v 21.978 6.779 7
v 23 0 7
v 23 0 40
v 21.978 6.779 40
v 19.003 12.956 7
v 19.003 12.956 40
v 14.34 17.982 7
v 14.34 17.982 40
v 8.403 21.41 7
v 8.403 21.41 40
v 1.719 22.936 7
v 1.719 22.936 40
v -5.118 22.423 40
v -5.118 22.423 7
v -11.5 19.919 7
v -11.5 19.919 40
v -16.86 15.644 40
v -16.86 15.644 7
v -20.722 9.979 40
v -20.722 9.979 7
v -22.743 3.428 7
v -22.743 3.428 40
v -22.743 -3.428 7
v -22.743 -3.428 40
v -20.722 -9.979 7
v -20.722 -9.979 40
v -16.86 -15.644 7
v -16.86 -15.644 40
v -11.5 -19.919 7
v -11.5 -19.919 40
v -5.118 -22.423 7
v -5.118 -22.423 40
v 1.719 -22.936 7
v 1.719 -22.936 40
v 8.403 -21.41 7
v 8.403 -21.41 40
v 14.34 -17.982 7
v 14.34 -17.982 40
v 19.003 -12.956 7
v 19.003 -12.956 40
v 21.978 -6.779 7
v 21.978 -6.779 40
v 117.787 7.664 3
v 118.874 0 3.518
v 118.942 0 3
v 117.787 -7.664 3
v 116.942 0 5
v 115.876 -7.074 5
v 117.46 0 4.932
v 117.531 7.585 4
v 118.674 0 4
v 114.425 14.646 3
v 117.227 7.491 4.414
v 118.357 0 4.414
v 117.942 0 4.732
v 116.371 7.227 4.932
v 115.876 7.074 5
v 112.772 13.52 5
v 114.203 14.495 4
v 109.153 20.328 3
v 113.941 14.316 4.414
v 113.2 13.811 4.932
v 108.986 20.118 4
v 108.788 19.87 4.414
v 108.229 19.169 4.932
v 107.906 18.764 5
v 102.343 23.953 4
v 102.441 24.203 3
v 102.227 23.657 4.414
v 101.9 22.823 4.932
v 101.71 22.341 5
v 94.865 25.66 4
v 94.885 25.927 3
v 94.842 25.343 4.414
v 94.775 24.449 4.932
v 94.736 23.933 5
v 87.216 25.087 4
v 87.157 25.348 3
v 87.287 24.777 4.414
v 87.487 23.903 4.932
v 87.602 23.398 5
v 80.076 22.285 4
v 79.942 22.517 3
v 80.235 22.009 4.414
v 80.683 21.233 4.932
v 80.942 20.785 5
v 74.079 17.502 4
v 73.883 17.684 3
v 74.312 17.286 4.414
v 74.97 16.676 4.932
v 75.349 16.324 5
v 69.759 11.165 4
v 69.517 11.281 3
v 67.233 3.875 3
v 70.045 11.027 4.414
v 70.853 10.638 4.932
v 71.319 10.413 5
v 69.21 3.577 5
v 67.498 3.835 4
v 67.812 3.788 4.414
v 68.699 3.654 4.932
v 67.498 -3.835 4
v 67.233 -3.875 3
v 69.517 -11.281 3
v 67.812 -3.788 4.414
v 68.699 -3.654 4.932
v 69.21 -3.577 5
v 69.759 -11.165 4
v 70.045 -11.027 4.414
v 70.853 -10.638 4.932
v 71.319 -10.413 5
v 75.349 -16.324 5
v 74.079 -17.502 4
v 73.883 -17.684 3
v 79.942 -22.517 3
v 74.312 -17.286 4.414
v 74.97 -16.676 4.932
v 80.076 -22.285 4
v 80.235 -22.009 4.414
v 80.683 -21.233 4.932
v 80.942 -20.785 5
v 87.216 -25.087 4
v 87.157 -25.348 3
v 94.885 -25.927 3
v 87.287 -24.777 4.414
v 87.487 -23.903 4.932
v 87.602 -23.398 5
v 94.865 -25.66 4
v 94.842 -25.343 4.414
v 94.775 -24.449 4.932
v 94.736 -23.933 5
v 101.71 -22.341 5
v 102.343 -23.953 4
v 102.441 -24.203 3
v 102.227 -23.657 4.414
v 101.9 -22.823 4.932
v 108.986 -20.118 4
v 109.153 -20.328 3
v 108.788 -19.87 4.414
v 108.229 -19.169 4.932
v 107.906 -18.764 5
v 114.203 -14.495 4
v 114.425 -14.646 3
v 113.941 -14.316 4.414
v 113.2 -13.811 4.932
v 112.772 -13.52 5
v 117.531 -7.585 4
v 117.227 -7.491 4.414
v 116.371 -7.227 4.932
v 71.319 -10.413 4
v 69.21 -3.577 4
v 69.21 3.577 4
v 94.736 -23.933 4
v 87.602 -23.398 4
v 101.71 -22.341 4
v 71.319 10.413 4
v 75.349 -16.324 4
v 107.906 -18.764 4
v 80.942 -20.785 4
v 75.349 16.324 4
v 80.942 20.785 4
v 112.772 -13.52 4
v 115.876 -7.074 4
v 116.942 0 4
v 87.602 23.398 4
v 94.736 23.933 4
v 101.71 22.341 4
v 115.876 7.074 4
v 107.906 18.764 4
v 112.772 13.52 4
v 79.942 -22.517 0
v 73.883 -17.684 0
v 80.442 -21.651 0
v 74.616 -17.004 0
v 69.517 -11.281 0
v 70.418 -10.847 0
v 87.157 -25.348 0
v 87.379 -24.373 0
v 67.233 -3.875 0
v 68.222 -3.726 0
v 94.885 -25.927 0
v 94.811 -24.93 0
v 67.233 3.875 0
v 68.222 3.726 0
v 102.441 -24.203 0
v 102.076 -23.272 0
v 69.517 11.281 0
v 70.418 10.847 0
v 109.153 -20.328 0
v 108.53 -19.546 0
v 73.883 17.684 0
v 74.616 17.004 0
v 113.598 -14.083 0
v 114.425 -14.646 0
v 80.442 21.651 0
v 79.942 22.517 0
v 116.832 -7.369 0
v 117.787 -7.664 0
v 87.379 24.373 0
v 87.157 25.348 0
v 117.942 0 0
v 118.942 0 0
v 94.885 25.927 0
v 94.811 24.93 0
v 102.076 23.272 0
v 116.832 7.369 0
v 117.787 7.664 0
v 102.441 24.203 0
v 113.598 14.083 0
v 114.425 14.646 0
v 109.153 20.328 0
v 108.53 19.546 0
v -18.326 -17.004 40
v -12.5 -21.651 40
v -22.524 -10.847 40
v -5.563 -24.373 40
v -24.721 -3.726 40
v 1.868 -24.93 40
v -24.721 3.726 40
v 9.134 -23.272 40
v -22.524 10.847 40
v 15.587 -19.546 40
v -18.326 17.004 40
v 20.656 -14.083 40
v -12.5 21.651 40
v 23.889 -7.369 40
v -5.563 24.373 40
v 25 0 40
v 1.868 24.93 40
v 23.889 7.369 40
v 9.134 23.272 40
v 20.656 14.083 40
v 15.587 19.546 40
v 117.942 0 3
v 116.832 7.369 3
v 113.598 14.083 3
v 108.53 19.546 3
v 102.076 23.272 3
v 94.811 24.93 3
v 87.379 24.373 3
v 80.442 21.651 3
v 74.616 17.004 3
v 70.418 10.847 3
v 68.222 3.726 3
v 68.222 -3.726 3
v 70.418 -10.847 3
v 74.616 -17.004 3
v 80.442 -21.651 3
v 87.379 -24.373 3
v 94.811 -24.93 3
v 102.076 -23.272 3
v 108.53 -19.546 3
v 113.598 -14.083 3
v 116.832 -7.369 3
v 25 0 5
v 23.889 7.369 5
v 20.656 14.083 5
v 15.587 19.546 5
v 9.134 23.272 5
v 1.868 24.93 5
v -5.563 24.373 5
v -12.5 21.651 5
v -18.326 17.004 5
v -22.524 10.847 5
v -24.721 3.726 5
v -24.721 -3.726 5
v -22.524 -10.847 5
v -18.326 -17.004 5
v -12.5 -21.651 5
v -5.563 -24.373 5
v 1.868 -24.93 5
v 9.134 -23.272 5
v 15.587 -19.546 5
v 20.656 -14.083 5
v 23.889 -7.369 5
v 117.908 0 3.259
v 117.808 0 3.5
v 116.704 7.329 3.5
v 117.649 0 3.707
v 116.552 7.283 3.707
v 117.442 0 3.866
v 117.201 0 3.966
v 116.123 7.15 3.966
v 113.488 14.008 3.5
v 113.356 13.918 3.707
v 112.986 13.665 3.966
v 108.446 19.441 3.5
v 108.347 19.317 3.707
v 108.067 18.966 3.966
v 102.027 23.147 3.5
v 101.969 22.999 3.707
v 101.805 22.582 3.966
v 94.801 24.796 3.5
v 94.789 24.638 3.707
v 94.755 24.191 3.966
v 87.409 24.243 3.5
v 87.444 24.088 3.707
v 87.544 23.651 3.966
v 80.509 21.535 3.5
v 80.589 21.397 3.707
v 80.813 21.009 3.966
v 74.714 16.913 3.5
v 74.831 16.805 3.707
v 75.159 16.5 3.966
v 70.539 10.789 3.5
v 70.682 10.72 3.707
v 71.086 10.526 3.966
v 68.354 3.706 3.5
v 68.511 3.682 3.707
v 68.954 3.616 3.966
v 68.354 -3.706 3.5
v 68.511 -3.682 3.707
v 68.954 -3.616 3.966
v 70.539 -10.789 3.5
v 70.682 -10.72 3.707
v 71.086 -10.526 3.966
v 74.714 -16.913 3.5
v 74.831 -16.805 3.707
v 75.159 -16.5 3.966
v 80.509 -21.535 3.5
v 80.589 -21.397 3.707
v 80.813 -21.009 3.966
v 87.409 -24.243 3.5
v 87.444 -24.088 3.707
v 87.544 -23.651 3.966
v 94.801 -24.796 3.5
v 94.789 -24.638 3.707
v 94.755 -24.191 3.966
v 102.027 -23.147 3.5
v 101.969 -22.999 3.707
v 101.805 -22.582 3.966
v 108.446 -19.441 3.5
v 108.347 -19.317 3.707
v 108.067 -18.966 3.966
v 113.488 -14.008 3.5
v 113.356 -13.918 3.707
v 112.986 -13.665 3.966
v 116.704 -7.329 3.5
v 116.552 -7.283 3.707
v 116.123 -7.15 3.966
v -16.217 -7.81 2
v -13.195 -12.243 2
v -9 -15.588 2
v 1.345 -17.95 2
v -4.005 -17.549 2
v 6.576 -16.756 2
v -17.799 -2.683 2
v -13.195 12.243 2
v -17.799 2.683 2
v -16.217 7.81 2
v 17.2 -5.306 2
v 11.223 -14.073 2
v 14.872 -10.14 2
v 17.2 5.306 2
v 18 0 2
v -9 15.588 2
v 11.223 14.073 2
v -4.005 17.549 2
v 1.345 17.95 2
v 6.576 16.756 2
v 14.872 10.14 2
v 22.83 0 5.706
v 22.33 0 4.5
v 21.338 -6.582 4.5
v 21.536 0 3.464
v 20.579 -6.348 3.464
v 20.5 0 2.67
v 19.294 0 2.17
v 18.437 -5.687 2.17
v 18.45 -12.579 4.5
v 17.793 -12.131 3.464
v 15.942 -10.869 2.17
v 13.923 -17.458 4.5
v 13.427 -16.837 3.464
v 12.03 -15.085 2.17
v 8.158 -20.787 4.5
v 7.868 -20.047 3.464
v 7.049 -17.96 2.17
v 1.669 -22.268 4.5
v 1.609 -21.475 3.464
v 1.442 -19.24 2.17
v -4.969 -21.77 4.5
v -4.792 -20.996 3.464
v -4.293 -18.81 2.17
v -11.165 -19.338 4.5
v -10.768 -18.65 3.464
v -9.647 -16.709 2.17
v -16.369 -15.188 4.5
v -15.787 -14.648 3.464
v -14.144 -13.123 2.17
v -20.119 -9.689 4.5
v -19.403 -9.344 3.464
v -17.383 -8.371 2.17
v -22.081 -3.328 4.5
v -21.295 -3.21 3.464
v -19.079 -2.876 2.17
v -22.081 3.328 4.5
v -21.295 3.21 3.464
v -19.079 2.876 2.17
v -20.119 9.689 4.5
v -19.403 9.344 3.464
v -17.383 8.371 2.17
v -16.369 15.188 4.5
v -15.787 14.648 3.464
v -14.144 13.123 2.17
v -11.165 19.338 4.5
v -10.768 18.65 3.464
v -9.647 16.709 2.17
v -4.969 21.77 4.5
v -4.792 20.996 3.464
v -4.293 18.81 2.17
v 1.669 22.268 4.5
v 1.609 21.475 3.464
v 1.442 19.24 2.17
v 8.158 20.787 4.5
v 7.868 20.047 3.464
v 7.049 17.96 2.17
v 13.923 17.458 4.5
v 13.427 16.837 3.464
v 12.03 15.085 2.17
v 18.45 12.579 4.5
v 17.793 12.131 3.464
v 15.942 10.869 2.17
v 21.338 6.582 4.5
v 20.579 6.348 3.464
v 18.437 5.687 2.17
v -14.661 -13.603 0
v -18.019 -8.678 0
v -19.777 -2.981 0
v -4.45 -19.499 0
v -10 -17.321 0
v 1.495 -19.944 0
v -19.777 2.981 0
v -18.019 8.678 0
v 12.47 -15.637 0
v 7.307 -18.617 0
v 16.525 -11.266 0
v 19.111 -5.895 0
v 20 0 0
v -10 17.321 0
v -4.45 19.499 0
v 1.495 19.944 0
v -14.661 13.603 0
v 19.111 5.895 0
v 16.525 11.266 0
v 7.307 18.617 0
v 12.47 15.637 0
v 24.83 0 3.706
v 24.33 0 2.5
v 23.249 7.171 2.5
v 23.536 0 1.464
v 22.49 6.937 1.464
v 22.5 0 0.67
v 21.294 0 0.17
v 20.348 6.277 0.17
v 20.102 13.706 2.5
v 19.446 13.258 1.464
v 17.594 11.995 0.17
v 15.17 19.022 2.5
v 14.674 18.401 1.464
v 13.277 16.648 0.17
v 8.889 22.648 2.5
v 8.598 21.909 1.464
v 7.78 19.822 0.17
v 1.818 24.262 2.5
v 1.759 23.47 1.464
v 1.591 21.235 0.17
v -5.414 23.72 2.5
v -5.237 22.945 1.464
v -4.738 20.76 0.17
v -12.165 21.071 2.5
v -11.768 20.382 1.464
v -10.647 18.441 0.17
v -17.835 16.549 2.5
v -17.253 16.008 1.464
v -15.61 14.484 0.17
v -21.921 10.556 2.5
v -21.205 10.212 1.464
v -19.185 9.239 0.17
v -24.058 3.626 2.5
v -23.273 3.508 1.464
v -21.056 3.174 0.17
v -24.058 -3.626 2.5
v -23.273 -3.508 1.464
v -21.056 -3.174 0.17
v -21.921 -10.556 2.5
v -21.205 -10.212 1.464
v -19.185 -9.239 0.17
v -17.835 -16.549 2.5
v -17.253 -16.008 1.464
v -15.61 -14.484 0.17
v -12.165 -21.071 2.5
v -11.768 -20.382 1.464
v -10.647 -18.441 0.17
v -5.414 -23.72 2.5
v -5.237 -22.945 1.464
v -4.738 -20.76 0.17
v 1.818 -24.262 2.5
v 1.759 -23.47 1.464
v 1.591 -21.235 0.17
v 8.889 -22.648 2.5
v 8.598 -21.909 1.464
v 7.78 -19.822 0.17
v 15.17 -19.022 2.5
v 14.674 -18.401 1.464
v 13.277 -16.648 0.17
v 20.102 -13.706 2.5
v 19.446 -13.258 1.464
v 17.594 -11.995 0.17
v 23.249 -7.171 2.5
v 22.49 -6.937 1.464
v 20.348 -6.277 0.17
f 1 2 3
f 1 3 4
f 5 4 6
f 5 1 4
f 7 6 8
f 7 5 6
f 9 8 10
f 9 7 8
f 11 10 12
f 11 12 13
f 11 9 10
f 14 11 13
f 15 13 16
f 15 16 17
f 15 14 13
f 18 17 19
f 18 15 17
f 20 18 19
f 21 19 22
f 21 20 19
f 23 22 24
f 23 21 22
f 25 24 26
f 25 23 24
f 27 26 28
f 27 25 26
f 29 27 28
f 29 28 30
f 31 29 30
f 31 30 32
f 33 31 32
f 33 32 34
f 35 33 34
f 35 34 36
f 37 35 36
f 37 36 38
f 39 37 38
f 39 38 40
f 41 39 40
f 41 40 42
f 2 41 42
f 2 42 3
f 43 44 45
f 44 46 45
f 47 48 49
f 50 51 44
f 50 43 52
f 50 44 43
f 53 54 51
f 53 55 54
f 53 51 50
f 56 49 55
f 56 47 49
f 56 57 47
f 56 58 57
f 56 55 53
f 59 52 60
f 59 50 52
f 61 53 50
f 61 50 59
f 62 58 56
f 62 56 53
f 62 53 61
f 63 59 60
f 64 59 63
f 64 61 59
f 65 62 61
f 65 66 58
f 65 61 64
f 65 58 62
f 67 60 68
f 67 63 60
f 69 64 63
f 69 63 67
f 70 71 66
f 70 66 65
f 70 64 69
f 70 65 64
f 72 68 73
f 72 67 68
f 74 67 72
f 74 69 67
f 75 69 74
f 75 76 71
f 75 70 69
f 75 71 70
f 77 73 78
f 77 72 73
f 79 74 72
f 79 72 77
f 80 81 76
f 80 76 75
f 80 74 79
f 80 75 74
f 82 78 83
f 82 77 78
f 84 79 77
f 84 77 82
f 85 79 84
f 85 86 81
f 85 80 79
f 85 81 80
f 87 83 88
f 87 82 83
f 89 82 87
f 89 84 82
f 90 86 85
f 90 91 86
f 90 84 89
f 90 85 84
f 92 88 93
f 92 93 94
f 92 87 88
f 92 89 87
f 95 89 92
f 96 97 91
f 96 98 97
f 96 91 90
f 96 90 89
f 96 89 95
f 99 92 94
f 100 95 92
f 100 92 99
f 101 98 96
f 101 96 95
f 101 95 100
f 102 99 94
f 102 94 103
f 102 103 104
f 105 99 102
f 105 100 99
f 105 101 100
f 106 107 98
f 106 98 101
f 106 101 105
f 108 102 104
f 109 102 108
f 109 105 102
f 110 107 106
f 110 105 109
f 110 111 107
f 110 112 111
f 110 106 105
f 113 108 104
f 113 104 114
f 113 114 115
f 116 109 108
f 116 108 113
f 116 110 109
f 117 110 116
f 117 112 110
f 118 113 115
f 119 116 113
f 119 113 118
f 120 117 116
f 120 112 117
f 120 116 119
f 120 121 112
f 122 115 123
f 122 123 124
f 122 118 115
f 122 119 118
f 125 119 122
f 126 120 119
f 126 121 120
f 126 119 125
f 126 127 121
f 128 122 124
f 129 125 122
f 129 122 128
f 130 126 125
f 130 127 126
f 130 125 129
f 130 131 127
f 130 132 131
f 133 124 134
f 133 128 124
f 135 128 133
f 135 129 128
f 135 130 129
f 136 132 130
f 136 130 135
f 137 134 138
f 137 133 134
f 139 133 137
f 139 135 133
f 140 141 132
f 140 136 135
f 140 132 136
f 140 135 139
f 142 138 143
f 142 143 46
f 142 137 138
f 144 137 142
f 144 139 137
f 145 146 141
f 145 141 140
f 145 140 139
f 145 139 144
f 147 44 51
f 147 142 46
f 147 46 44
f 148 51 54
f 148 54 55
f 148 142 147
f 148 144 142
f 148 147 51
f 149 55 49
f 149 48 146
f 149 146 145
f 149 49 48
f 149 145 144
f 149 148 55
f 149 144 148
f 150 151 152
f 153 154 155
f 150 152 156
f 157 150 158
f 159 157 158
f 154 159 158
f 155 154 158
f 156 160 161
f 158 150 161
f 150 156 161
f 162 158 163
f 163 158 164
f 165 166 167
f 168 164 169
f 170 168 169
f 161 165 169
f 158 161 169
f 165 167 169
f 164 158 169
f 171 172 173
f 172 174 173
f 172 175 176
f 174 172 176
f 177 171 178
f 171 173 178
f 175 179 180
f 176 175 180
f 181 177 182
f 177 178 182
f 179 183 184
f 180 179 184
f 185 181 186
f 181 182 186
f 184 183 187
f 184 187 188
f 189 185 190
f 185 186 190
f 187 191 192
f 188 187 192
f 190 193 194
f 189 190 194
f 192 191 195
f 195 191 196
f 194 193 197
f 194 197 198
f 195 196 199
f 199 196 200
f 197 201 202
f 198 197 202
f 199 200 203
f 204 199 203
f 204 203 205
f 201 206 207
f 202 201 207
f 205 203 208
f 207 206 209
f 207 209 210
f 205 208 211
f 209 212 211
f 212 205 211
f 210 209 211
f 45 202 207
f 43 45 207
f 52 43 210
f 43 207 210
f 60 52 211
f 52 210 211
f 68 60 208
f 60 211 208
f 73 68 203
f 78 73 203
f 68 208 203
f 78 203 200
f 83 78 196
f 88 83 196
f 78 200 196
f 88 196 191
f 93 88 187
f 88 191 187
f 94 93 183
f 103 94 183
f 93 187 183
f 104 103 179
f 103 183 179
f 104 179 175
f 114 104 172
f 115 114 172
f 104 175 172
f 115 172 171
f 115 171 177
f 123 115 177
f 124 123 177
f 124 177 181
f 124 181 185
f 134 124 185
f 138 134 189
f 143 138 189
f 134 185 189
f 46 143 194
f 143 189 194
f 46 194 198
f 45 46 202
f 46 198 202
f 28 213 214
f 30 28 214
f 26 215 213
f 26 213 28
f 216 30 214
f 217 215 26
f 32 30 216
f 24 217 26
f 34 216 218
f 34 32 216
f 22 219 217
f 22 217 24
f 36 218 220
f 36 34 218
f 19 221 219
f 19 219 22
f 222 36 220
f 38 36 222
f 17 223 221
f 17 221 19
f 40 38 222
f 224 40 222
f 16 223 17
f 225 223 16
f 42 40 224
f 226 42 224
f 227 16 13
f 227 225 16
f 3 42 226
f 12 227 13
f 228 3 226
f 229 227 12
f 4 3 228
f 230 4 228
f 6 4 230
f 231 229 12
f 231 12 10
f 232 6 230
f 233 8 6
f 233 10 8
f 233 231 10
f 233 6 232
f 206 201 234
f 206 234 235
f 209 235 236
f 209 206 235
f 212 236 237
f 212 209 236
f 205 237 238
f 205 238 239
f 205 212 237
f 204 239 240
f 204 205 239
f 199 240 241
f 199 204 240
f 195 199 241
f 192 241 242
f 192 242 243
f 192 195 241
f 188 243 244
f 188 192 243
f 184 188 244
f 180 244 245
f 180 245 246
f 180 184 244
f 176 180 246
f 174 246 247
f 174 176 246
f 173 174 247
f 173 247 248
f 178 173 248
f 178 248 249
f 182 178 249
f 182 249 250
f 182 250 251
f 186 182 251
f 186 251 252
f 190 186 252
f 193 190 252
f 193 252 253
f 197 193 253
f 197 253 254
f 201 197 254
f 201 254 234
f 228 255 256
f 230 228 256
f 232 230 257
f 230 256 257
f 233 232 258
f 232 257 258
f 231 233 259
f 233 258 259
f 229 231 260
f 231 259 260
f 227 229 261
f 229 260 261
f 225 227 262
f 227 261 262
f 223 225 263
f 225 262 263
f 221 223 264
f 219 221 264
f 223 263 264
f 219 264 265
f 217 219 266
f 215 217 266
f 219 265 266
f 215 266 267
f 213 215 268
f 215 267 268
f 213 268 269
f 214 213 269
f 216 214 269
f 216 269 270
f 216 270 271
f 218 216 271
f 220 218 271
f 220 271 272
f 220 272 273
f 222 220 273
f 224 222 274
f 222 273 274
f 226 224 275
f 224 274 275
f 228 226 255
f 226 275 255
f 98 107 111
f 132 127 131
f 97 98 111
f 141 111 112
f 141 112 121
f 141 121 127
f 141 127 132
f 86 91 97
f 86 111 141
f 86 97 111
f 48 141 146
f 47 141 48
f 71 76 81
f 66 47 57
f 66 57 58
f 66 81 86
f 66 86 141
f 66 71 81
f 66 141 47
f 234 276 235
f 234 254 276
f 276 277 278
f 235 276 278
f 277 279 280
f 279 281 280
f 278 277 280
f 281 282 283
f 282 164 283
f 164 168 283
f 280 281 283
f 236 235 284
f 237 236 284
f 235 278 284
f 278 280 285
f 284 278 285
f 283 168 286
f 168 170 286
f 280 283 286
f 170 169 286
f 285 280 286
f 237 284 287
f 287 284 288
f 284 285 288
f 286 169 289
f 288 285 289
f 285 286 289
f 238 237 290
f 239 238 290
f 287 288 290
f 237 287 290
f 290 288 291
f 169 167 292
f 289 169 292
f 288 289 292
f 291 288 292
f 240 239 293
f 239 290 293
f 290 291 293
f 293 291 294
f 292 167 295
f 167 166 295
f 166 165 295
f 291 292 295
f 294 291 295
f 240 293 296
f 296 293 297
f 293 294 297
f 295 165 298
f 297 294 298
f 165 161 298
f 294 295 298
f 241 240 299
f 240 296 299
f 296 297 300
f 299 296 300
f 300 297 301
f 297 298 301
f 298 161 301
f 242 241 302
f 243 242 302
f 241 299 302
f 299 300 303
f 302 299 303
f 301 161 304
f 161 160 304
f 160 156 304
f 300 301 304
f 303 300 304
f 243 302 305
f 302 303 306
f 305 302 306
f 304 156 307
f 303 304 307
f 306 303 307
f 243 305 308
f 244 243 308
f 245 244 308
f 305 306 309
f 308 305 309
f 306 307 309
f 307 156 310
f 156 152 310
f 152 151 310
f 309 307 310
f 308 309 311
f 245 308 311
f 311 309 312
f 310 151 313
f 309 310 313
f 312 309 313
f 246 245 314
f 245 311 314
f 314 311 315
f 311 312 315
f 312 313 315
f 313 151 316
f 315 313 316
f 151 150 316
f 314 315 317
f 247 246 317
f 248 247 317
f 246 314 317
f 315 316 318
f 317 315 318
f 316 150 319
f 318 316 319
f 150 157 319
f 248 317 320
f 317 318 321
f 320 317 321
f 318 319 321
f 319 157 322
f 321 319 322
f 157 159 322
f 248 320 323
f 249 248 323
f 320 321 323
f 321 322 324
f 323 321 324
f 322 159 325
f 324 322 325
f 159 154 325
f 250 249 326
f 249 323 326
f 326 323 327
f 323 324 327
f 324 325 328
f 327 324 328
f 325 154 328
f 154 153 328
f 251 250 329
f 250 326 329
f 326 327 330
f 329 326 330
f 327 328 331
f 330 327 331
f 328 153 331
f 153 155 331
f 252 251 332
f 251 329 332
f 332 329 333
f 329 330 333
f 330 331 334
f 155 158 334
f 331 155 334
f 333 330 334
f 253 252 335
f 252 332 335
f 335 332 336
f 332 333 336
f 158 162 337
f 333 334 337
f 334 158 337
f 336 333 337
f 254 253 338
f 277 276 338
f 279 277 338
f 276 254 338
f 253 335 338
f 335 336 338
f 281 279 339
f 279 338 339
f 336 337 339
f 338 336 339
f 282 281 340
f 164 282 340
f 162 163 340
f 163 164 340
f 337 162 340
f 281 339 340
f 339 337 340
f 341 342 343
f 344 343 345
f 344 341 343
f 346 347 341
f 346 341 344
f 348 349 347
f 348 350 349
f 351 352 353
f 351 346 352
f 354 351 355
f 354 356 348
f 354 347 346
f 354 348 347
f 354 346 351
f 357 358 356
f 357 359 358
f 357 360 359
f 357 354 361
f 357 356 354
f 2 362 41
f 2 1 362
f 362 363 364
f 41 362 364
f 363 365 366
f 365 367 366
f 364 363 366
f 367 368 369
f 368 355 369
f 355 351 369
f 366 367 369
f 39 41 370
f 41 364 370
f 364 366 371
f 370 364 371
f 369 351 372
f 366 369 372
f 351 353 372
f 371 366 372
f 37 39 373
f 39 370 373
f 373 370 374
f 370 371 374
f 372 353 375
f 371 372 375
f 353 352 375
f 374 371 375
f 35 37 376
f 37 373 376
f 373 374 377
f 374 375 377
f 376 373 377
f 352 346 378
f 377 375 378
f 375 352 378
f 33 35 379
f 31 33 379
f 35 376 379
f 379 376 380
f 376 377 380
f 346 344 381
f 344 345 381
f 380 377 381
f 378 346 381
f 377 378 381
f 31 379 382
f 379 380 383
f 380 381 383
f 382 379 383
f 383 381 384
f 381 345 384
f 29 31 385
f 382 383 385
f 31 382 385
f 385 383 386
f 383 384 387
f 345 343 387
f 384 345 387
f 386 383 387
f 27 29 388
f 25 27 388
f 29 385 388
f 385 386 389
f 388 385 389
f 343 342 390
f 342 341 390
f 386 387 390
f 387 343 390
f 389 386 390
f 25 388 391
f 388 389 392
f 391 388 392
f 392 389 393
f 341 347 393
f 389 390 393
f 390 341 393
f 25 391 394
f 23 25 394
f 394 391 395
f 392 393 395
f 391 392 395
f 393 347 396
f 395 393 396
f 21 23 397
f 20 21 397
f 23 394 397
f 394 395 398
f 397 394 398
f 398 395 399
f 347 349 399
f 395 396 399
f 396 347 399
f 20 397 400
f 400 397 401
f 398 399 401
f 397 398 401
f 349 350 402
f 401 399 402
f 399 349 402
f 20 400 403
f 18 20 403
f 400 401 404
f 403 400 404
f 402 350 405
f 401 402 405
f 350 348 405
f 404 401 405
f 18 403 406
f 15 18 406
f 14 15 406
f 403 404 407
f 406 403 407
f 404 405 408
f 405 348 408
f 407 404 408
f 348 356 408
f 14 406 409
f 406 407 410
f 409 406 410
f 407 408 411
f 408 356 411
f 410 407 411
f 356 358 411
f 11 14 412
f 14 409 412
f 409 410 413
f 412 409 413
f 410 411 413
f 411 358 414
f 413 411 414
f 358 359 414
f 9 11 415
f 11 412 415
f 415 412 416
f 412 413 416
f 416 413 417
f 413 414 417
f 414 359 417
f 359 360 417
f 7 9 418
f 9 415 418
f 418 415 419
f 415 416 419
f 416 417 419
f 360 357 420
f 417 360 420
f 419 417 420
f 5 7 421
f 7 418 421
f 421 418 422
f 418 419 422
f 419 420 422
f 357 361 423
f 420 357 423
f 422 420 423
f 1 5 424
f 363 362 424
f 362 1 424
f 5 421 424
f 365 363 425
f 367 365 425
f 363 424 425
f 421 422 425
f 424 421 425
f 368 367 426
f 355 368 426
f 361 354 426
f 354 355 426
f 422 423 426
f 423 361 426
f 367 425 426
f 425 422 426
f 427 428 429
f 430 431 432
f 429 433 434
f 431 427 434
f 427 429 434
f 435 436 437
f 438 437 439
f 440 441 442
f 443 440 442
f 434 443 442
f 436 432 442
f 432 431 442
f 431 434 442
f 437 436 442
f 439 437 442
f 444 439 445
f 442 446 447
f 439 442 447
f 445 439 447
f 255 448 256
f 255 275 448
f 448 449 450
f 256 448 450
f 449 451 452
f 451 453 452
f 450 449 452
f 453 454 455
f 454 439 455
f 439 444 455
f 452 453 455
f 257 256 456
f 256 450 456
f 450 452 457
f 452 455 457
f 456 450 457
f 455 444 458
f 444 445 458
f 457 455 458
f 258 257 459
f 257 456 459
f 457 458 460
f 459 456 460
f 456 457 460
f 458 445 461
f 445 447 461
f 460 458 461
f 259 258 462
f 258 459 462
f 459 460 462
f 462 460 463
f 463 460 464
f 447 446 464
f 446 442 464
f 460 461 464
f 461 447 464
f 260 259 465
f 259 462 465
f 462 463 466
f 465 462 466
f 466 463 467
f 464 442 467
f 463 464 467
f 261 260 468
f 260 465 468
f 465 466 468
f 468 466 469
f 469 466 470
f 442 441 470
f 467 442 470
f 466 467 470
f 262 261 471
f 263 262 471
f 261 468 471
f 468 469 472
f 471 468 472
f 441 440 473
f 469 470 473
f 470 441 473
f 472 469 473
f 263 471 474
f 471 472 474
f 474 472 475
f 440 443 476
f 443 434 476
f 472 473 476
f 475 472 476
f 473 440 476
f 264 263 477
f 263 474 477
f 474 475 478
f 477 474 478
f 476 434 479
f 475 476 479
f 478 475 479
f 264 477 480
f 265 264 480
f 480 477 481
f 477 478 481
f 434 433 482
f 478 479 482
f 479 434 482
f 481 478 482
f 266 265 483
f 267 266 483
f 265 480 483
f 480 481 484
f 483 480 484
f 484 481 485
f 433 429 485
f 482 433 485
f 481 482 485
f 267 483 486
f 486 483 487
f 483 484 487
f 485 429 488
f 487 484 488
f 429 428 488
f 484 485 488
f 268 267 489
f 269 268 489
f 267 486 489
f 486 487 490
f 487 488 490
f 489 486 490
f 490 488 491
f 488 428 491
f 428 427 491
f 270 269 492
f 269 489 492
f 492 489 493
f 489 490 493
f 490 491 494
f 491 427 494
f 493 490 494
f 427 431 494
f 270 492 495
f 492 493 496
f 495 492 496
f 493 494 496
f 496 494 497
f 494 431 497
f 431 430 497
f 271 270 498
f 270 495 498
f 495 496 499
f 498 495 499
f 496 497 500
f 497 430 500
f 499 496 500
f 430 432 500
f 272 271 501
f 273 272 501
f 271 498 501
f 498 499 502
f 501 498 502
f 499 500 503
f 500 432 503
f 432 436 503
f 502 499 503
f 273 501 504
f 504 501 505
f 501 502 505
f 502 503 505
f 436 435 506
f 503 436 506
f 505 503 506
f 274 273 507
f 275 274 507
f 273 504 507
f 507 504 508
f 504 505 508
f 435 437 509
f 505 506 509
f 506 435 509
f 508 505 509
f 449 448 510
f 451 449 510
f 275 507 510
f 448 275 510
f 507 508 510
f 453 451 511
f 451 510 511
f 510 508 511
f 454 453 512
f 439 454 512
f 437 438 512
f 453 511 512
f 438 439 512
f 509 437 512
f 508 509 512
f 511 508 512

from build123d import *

# Parameters (mm, degrees)
F0_R     = 25
F1_DEPTH = 40
F0_R_2   = 26
F2_DEPTH = 5
F3_R     = 2
F4_T     = -2
F5_R     = 5
F6_R     = 5
F7_T     = -1


with BuildPart() as f1:
    # F0 (on Top) → F1 (new body)
    with BuildSketch(Plane.XY):
        Circle(F0_R)
    extrude(amount=F1_DEPTH)

    # F4
    f4_openings = [f1.faces().sort_by_distance(p)[0] for p in [
        (0, 0, 40),
    ]]
    offset(amount=F4_T, openings=f4_openings)

    # F5
    f5_edges = [f1.edges().sort_by_distance(p)[0] for p in [
        (-23, 0, 2),
    ]]
    fillet(f5_edges, radius=F5_R)

    # F6
    f6_edges = [f1.edges().sort_by_distance(p)[0] for p in [
        (-25, 0, 0),
    ]]
    fillet(f6_edges, radius=F6_R)


with BuildPart() as f2:
    # F0 (on Top) → F2 (new body)
    with BuildSketch(Plane.XY):
        with Locations((92.9422974586, 0)):
            Circle(F0_R_2)
    extrude(amount=F2_DEPTH)

    # F3
    f3_edges = [f2.edges().sort_by_distance(p)[0] for p in [
        (66.942297, 0, 5),
    ]]
    fillet(f3_edges, radius=F3_R)

    # F7
    f7_openings = [f2.faces().sort_by_distance(p)[0] for p in [
        (92.942297, 0, 0),
    ]]
    offset(amount=F7_T, openings=f7_openings)


solid = Compound([f1.part, f2.part])
